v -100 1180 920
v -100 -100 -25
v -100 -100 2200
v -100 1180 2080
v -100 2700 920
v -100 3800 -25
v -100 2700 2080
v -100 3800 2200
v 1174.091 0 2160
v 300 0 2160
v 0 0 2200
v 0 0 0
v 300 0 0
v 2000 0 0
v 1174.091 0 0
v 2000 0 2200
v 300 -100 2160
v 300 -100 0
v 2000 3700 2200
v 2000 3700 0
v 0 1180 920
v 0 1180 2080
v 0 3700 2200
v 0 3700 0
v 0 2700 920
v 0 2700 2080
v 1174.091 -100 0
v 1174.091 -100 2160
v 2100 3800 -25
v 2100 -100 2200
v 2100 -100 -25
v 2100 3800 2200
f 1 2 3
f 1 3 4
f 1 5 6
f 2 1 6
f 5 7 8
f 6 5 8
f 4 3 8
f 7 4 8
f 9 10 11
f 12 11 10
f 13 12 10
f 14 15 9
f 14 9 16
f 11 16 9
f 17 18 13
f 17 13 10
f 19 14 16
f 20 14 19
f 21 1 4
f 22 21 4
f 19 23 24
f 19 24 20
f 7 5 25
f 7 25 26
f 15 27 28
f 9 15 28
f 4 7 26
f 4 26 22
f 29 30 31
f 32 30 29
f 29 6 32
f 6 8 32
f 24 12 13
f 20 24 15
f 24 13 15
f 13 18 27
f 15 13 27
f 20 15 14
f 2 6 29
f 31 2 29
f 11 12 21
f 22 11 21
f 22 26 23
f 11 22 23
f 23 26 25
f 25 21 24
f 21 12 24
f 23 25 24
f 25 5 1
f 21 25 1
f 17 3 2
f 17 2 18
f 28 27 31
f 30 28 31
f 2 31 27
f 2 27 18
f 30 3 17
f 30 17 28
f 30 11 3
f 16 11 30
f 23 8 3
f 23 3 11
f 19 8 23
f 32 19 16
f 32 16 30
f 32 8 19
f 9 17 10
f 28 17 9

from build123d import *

# Parameters (mm, degrees)
F0_W     = 2200
F0_H     = 3900
F0_W_2   = 2000
F0_H_2   = 3700
F1_DEPTH = 2200
F2_DEPTH = 25
F3_W     = 874.091219902
F3_H     = 2160
F4_DEPTH = 100
F5_W     = 1520
F5_H     = 1160
F6_DEPTH = 100


with BuildPart() as f1:
    # F0 (on Top) → F1 (new body)
    with BuildSketch(Plane.XY):
        with Locations((1000, 1850)):
            Rectangle(F0_W, F0_H)
        with Locations((1000, 1850)):
            Rectangle(F0_W_2, F0_H_2, mode=Mode.SUBTRACT)
    extrude(amount=F1_DEPTH)

    # F0 (on Top) → F2 (join)
    with BuildSketch(Plane.XY):
        with Locations((1000, 1850)):
            Rectangle(F0_W, F0_H)
        with Locations((1000, 1850)):
            Rectangle(F0_W_2, F0_H_2, mode=Mode.SUBTRACT)
        with Locations((1000, 1850)):
            Rectangle(F0_W_2, F0_H_2)
    extrude(amount=-F2_DEPTH)

    # F3 (on face) → F4 (cut, through all)
    with BuildSketch(Plane.XZ.offset(100)):
        with Locations((737.045609951, 1080)):
            Rectangle(F3_W, F3_H)
    extrude(amount=-F4_DEPTH, mode=Mode.SUBTRACT)

    # F5 (on face) → F6 (cut, through all)
    with BuildSketch(Plane(origin=(-100, 0, 0), x_dir=(0, -1, 0), z_dir=(-1, 0, 0))):
        with Locations((-1940, 1500)):
            Rectangle(F5_W, F5_H)
    extrude(amount=-F6_DEPTH, mode=Mode.SUBTRACT)


solid = f1.part
